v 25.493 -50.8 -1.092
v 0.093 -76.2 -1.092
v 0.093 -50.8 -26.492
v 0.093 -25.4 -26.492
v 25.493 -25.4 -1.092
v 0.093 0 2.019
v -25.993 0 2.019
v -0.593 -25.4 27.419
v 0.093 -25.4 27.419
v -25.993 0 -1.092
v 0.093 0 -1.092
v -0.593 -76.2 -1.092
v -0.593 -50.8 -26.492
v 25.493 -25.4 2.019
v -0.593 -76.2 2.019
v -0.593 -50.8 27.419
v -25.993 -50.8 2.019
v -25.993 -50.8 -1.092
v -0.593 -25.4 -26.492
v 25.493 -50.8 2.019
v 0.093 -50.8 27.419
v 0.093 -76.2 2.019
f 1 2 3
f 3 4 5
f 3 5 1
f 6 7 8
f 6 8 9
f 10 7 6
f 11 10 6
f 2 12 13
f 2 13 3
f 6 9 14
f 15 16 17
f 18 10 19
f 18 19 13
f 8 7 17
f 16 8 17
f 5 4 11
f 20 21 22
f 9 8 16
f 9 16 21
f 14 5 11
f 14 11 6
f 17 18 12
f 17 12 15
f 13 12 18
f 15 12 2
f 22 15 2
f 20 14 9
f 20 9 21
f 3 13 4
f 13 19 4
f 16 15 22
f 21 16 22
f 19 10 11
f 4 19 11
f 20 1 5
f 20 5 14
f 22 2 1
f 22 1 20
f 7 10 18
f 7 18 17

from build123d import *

# Parameters (mm, degrees)
F0_W     = 51.485936
F0_H     = 53.910483
F1_DEPTH = 76.2
F2_SIZE  = 25.4


with BuildPart() as f1:
    # F0 (on Front) → F1 (new body)
    with BuildSketch(Plane.XZ):
        with Locations((-0.249586, 0.463515)):
            Rectangle(F0_W, F0_H)
    extrude(amount=F1_DEPTH)

    # F2
    f2_edges = [f1.edges().sort_by_distance(p)[0] for p in [
        (25.493382, -38.1, 27.418757),
        (-25.992554, -38.1, 27.418757),
        (-0.249586, 0, 27.418757),
        (-0.249586, -76.2, 27.418757),
        (-25.992554, -76.2, 0.463516),
        (-0.249586, -76.2, -26.491726),
        (25.493382, -76.2, 0.463516),
        (-25.992554, -38.1, -26.491726),
        (25.493382, -38.1, -26.491726),
        (-0.249586, 0, -26.491726),
        (25.493382, 0, 0.463516),
    ]]
    chamfer(f2_edges, length=F2_SIZE)


solid = f1.part
